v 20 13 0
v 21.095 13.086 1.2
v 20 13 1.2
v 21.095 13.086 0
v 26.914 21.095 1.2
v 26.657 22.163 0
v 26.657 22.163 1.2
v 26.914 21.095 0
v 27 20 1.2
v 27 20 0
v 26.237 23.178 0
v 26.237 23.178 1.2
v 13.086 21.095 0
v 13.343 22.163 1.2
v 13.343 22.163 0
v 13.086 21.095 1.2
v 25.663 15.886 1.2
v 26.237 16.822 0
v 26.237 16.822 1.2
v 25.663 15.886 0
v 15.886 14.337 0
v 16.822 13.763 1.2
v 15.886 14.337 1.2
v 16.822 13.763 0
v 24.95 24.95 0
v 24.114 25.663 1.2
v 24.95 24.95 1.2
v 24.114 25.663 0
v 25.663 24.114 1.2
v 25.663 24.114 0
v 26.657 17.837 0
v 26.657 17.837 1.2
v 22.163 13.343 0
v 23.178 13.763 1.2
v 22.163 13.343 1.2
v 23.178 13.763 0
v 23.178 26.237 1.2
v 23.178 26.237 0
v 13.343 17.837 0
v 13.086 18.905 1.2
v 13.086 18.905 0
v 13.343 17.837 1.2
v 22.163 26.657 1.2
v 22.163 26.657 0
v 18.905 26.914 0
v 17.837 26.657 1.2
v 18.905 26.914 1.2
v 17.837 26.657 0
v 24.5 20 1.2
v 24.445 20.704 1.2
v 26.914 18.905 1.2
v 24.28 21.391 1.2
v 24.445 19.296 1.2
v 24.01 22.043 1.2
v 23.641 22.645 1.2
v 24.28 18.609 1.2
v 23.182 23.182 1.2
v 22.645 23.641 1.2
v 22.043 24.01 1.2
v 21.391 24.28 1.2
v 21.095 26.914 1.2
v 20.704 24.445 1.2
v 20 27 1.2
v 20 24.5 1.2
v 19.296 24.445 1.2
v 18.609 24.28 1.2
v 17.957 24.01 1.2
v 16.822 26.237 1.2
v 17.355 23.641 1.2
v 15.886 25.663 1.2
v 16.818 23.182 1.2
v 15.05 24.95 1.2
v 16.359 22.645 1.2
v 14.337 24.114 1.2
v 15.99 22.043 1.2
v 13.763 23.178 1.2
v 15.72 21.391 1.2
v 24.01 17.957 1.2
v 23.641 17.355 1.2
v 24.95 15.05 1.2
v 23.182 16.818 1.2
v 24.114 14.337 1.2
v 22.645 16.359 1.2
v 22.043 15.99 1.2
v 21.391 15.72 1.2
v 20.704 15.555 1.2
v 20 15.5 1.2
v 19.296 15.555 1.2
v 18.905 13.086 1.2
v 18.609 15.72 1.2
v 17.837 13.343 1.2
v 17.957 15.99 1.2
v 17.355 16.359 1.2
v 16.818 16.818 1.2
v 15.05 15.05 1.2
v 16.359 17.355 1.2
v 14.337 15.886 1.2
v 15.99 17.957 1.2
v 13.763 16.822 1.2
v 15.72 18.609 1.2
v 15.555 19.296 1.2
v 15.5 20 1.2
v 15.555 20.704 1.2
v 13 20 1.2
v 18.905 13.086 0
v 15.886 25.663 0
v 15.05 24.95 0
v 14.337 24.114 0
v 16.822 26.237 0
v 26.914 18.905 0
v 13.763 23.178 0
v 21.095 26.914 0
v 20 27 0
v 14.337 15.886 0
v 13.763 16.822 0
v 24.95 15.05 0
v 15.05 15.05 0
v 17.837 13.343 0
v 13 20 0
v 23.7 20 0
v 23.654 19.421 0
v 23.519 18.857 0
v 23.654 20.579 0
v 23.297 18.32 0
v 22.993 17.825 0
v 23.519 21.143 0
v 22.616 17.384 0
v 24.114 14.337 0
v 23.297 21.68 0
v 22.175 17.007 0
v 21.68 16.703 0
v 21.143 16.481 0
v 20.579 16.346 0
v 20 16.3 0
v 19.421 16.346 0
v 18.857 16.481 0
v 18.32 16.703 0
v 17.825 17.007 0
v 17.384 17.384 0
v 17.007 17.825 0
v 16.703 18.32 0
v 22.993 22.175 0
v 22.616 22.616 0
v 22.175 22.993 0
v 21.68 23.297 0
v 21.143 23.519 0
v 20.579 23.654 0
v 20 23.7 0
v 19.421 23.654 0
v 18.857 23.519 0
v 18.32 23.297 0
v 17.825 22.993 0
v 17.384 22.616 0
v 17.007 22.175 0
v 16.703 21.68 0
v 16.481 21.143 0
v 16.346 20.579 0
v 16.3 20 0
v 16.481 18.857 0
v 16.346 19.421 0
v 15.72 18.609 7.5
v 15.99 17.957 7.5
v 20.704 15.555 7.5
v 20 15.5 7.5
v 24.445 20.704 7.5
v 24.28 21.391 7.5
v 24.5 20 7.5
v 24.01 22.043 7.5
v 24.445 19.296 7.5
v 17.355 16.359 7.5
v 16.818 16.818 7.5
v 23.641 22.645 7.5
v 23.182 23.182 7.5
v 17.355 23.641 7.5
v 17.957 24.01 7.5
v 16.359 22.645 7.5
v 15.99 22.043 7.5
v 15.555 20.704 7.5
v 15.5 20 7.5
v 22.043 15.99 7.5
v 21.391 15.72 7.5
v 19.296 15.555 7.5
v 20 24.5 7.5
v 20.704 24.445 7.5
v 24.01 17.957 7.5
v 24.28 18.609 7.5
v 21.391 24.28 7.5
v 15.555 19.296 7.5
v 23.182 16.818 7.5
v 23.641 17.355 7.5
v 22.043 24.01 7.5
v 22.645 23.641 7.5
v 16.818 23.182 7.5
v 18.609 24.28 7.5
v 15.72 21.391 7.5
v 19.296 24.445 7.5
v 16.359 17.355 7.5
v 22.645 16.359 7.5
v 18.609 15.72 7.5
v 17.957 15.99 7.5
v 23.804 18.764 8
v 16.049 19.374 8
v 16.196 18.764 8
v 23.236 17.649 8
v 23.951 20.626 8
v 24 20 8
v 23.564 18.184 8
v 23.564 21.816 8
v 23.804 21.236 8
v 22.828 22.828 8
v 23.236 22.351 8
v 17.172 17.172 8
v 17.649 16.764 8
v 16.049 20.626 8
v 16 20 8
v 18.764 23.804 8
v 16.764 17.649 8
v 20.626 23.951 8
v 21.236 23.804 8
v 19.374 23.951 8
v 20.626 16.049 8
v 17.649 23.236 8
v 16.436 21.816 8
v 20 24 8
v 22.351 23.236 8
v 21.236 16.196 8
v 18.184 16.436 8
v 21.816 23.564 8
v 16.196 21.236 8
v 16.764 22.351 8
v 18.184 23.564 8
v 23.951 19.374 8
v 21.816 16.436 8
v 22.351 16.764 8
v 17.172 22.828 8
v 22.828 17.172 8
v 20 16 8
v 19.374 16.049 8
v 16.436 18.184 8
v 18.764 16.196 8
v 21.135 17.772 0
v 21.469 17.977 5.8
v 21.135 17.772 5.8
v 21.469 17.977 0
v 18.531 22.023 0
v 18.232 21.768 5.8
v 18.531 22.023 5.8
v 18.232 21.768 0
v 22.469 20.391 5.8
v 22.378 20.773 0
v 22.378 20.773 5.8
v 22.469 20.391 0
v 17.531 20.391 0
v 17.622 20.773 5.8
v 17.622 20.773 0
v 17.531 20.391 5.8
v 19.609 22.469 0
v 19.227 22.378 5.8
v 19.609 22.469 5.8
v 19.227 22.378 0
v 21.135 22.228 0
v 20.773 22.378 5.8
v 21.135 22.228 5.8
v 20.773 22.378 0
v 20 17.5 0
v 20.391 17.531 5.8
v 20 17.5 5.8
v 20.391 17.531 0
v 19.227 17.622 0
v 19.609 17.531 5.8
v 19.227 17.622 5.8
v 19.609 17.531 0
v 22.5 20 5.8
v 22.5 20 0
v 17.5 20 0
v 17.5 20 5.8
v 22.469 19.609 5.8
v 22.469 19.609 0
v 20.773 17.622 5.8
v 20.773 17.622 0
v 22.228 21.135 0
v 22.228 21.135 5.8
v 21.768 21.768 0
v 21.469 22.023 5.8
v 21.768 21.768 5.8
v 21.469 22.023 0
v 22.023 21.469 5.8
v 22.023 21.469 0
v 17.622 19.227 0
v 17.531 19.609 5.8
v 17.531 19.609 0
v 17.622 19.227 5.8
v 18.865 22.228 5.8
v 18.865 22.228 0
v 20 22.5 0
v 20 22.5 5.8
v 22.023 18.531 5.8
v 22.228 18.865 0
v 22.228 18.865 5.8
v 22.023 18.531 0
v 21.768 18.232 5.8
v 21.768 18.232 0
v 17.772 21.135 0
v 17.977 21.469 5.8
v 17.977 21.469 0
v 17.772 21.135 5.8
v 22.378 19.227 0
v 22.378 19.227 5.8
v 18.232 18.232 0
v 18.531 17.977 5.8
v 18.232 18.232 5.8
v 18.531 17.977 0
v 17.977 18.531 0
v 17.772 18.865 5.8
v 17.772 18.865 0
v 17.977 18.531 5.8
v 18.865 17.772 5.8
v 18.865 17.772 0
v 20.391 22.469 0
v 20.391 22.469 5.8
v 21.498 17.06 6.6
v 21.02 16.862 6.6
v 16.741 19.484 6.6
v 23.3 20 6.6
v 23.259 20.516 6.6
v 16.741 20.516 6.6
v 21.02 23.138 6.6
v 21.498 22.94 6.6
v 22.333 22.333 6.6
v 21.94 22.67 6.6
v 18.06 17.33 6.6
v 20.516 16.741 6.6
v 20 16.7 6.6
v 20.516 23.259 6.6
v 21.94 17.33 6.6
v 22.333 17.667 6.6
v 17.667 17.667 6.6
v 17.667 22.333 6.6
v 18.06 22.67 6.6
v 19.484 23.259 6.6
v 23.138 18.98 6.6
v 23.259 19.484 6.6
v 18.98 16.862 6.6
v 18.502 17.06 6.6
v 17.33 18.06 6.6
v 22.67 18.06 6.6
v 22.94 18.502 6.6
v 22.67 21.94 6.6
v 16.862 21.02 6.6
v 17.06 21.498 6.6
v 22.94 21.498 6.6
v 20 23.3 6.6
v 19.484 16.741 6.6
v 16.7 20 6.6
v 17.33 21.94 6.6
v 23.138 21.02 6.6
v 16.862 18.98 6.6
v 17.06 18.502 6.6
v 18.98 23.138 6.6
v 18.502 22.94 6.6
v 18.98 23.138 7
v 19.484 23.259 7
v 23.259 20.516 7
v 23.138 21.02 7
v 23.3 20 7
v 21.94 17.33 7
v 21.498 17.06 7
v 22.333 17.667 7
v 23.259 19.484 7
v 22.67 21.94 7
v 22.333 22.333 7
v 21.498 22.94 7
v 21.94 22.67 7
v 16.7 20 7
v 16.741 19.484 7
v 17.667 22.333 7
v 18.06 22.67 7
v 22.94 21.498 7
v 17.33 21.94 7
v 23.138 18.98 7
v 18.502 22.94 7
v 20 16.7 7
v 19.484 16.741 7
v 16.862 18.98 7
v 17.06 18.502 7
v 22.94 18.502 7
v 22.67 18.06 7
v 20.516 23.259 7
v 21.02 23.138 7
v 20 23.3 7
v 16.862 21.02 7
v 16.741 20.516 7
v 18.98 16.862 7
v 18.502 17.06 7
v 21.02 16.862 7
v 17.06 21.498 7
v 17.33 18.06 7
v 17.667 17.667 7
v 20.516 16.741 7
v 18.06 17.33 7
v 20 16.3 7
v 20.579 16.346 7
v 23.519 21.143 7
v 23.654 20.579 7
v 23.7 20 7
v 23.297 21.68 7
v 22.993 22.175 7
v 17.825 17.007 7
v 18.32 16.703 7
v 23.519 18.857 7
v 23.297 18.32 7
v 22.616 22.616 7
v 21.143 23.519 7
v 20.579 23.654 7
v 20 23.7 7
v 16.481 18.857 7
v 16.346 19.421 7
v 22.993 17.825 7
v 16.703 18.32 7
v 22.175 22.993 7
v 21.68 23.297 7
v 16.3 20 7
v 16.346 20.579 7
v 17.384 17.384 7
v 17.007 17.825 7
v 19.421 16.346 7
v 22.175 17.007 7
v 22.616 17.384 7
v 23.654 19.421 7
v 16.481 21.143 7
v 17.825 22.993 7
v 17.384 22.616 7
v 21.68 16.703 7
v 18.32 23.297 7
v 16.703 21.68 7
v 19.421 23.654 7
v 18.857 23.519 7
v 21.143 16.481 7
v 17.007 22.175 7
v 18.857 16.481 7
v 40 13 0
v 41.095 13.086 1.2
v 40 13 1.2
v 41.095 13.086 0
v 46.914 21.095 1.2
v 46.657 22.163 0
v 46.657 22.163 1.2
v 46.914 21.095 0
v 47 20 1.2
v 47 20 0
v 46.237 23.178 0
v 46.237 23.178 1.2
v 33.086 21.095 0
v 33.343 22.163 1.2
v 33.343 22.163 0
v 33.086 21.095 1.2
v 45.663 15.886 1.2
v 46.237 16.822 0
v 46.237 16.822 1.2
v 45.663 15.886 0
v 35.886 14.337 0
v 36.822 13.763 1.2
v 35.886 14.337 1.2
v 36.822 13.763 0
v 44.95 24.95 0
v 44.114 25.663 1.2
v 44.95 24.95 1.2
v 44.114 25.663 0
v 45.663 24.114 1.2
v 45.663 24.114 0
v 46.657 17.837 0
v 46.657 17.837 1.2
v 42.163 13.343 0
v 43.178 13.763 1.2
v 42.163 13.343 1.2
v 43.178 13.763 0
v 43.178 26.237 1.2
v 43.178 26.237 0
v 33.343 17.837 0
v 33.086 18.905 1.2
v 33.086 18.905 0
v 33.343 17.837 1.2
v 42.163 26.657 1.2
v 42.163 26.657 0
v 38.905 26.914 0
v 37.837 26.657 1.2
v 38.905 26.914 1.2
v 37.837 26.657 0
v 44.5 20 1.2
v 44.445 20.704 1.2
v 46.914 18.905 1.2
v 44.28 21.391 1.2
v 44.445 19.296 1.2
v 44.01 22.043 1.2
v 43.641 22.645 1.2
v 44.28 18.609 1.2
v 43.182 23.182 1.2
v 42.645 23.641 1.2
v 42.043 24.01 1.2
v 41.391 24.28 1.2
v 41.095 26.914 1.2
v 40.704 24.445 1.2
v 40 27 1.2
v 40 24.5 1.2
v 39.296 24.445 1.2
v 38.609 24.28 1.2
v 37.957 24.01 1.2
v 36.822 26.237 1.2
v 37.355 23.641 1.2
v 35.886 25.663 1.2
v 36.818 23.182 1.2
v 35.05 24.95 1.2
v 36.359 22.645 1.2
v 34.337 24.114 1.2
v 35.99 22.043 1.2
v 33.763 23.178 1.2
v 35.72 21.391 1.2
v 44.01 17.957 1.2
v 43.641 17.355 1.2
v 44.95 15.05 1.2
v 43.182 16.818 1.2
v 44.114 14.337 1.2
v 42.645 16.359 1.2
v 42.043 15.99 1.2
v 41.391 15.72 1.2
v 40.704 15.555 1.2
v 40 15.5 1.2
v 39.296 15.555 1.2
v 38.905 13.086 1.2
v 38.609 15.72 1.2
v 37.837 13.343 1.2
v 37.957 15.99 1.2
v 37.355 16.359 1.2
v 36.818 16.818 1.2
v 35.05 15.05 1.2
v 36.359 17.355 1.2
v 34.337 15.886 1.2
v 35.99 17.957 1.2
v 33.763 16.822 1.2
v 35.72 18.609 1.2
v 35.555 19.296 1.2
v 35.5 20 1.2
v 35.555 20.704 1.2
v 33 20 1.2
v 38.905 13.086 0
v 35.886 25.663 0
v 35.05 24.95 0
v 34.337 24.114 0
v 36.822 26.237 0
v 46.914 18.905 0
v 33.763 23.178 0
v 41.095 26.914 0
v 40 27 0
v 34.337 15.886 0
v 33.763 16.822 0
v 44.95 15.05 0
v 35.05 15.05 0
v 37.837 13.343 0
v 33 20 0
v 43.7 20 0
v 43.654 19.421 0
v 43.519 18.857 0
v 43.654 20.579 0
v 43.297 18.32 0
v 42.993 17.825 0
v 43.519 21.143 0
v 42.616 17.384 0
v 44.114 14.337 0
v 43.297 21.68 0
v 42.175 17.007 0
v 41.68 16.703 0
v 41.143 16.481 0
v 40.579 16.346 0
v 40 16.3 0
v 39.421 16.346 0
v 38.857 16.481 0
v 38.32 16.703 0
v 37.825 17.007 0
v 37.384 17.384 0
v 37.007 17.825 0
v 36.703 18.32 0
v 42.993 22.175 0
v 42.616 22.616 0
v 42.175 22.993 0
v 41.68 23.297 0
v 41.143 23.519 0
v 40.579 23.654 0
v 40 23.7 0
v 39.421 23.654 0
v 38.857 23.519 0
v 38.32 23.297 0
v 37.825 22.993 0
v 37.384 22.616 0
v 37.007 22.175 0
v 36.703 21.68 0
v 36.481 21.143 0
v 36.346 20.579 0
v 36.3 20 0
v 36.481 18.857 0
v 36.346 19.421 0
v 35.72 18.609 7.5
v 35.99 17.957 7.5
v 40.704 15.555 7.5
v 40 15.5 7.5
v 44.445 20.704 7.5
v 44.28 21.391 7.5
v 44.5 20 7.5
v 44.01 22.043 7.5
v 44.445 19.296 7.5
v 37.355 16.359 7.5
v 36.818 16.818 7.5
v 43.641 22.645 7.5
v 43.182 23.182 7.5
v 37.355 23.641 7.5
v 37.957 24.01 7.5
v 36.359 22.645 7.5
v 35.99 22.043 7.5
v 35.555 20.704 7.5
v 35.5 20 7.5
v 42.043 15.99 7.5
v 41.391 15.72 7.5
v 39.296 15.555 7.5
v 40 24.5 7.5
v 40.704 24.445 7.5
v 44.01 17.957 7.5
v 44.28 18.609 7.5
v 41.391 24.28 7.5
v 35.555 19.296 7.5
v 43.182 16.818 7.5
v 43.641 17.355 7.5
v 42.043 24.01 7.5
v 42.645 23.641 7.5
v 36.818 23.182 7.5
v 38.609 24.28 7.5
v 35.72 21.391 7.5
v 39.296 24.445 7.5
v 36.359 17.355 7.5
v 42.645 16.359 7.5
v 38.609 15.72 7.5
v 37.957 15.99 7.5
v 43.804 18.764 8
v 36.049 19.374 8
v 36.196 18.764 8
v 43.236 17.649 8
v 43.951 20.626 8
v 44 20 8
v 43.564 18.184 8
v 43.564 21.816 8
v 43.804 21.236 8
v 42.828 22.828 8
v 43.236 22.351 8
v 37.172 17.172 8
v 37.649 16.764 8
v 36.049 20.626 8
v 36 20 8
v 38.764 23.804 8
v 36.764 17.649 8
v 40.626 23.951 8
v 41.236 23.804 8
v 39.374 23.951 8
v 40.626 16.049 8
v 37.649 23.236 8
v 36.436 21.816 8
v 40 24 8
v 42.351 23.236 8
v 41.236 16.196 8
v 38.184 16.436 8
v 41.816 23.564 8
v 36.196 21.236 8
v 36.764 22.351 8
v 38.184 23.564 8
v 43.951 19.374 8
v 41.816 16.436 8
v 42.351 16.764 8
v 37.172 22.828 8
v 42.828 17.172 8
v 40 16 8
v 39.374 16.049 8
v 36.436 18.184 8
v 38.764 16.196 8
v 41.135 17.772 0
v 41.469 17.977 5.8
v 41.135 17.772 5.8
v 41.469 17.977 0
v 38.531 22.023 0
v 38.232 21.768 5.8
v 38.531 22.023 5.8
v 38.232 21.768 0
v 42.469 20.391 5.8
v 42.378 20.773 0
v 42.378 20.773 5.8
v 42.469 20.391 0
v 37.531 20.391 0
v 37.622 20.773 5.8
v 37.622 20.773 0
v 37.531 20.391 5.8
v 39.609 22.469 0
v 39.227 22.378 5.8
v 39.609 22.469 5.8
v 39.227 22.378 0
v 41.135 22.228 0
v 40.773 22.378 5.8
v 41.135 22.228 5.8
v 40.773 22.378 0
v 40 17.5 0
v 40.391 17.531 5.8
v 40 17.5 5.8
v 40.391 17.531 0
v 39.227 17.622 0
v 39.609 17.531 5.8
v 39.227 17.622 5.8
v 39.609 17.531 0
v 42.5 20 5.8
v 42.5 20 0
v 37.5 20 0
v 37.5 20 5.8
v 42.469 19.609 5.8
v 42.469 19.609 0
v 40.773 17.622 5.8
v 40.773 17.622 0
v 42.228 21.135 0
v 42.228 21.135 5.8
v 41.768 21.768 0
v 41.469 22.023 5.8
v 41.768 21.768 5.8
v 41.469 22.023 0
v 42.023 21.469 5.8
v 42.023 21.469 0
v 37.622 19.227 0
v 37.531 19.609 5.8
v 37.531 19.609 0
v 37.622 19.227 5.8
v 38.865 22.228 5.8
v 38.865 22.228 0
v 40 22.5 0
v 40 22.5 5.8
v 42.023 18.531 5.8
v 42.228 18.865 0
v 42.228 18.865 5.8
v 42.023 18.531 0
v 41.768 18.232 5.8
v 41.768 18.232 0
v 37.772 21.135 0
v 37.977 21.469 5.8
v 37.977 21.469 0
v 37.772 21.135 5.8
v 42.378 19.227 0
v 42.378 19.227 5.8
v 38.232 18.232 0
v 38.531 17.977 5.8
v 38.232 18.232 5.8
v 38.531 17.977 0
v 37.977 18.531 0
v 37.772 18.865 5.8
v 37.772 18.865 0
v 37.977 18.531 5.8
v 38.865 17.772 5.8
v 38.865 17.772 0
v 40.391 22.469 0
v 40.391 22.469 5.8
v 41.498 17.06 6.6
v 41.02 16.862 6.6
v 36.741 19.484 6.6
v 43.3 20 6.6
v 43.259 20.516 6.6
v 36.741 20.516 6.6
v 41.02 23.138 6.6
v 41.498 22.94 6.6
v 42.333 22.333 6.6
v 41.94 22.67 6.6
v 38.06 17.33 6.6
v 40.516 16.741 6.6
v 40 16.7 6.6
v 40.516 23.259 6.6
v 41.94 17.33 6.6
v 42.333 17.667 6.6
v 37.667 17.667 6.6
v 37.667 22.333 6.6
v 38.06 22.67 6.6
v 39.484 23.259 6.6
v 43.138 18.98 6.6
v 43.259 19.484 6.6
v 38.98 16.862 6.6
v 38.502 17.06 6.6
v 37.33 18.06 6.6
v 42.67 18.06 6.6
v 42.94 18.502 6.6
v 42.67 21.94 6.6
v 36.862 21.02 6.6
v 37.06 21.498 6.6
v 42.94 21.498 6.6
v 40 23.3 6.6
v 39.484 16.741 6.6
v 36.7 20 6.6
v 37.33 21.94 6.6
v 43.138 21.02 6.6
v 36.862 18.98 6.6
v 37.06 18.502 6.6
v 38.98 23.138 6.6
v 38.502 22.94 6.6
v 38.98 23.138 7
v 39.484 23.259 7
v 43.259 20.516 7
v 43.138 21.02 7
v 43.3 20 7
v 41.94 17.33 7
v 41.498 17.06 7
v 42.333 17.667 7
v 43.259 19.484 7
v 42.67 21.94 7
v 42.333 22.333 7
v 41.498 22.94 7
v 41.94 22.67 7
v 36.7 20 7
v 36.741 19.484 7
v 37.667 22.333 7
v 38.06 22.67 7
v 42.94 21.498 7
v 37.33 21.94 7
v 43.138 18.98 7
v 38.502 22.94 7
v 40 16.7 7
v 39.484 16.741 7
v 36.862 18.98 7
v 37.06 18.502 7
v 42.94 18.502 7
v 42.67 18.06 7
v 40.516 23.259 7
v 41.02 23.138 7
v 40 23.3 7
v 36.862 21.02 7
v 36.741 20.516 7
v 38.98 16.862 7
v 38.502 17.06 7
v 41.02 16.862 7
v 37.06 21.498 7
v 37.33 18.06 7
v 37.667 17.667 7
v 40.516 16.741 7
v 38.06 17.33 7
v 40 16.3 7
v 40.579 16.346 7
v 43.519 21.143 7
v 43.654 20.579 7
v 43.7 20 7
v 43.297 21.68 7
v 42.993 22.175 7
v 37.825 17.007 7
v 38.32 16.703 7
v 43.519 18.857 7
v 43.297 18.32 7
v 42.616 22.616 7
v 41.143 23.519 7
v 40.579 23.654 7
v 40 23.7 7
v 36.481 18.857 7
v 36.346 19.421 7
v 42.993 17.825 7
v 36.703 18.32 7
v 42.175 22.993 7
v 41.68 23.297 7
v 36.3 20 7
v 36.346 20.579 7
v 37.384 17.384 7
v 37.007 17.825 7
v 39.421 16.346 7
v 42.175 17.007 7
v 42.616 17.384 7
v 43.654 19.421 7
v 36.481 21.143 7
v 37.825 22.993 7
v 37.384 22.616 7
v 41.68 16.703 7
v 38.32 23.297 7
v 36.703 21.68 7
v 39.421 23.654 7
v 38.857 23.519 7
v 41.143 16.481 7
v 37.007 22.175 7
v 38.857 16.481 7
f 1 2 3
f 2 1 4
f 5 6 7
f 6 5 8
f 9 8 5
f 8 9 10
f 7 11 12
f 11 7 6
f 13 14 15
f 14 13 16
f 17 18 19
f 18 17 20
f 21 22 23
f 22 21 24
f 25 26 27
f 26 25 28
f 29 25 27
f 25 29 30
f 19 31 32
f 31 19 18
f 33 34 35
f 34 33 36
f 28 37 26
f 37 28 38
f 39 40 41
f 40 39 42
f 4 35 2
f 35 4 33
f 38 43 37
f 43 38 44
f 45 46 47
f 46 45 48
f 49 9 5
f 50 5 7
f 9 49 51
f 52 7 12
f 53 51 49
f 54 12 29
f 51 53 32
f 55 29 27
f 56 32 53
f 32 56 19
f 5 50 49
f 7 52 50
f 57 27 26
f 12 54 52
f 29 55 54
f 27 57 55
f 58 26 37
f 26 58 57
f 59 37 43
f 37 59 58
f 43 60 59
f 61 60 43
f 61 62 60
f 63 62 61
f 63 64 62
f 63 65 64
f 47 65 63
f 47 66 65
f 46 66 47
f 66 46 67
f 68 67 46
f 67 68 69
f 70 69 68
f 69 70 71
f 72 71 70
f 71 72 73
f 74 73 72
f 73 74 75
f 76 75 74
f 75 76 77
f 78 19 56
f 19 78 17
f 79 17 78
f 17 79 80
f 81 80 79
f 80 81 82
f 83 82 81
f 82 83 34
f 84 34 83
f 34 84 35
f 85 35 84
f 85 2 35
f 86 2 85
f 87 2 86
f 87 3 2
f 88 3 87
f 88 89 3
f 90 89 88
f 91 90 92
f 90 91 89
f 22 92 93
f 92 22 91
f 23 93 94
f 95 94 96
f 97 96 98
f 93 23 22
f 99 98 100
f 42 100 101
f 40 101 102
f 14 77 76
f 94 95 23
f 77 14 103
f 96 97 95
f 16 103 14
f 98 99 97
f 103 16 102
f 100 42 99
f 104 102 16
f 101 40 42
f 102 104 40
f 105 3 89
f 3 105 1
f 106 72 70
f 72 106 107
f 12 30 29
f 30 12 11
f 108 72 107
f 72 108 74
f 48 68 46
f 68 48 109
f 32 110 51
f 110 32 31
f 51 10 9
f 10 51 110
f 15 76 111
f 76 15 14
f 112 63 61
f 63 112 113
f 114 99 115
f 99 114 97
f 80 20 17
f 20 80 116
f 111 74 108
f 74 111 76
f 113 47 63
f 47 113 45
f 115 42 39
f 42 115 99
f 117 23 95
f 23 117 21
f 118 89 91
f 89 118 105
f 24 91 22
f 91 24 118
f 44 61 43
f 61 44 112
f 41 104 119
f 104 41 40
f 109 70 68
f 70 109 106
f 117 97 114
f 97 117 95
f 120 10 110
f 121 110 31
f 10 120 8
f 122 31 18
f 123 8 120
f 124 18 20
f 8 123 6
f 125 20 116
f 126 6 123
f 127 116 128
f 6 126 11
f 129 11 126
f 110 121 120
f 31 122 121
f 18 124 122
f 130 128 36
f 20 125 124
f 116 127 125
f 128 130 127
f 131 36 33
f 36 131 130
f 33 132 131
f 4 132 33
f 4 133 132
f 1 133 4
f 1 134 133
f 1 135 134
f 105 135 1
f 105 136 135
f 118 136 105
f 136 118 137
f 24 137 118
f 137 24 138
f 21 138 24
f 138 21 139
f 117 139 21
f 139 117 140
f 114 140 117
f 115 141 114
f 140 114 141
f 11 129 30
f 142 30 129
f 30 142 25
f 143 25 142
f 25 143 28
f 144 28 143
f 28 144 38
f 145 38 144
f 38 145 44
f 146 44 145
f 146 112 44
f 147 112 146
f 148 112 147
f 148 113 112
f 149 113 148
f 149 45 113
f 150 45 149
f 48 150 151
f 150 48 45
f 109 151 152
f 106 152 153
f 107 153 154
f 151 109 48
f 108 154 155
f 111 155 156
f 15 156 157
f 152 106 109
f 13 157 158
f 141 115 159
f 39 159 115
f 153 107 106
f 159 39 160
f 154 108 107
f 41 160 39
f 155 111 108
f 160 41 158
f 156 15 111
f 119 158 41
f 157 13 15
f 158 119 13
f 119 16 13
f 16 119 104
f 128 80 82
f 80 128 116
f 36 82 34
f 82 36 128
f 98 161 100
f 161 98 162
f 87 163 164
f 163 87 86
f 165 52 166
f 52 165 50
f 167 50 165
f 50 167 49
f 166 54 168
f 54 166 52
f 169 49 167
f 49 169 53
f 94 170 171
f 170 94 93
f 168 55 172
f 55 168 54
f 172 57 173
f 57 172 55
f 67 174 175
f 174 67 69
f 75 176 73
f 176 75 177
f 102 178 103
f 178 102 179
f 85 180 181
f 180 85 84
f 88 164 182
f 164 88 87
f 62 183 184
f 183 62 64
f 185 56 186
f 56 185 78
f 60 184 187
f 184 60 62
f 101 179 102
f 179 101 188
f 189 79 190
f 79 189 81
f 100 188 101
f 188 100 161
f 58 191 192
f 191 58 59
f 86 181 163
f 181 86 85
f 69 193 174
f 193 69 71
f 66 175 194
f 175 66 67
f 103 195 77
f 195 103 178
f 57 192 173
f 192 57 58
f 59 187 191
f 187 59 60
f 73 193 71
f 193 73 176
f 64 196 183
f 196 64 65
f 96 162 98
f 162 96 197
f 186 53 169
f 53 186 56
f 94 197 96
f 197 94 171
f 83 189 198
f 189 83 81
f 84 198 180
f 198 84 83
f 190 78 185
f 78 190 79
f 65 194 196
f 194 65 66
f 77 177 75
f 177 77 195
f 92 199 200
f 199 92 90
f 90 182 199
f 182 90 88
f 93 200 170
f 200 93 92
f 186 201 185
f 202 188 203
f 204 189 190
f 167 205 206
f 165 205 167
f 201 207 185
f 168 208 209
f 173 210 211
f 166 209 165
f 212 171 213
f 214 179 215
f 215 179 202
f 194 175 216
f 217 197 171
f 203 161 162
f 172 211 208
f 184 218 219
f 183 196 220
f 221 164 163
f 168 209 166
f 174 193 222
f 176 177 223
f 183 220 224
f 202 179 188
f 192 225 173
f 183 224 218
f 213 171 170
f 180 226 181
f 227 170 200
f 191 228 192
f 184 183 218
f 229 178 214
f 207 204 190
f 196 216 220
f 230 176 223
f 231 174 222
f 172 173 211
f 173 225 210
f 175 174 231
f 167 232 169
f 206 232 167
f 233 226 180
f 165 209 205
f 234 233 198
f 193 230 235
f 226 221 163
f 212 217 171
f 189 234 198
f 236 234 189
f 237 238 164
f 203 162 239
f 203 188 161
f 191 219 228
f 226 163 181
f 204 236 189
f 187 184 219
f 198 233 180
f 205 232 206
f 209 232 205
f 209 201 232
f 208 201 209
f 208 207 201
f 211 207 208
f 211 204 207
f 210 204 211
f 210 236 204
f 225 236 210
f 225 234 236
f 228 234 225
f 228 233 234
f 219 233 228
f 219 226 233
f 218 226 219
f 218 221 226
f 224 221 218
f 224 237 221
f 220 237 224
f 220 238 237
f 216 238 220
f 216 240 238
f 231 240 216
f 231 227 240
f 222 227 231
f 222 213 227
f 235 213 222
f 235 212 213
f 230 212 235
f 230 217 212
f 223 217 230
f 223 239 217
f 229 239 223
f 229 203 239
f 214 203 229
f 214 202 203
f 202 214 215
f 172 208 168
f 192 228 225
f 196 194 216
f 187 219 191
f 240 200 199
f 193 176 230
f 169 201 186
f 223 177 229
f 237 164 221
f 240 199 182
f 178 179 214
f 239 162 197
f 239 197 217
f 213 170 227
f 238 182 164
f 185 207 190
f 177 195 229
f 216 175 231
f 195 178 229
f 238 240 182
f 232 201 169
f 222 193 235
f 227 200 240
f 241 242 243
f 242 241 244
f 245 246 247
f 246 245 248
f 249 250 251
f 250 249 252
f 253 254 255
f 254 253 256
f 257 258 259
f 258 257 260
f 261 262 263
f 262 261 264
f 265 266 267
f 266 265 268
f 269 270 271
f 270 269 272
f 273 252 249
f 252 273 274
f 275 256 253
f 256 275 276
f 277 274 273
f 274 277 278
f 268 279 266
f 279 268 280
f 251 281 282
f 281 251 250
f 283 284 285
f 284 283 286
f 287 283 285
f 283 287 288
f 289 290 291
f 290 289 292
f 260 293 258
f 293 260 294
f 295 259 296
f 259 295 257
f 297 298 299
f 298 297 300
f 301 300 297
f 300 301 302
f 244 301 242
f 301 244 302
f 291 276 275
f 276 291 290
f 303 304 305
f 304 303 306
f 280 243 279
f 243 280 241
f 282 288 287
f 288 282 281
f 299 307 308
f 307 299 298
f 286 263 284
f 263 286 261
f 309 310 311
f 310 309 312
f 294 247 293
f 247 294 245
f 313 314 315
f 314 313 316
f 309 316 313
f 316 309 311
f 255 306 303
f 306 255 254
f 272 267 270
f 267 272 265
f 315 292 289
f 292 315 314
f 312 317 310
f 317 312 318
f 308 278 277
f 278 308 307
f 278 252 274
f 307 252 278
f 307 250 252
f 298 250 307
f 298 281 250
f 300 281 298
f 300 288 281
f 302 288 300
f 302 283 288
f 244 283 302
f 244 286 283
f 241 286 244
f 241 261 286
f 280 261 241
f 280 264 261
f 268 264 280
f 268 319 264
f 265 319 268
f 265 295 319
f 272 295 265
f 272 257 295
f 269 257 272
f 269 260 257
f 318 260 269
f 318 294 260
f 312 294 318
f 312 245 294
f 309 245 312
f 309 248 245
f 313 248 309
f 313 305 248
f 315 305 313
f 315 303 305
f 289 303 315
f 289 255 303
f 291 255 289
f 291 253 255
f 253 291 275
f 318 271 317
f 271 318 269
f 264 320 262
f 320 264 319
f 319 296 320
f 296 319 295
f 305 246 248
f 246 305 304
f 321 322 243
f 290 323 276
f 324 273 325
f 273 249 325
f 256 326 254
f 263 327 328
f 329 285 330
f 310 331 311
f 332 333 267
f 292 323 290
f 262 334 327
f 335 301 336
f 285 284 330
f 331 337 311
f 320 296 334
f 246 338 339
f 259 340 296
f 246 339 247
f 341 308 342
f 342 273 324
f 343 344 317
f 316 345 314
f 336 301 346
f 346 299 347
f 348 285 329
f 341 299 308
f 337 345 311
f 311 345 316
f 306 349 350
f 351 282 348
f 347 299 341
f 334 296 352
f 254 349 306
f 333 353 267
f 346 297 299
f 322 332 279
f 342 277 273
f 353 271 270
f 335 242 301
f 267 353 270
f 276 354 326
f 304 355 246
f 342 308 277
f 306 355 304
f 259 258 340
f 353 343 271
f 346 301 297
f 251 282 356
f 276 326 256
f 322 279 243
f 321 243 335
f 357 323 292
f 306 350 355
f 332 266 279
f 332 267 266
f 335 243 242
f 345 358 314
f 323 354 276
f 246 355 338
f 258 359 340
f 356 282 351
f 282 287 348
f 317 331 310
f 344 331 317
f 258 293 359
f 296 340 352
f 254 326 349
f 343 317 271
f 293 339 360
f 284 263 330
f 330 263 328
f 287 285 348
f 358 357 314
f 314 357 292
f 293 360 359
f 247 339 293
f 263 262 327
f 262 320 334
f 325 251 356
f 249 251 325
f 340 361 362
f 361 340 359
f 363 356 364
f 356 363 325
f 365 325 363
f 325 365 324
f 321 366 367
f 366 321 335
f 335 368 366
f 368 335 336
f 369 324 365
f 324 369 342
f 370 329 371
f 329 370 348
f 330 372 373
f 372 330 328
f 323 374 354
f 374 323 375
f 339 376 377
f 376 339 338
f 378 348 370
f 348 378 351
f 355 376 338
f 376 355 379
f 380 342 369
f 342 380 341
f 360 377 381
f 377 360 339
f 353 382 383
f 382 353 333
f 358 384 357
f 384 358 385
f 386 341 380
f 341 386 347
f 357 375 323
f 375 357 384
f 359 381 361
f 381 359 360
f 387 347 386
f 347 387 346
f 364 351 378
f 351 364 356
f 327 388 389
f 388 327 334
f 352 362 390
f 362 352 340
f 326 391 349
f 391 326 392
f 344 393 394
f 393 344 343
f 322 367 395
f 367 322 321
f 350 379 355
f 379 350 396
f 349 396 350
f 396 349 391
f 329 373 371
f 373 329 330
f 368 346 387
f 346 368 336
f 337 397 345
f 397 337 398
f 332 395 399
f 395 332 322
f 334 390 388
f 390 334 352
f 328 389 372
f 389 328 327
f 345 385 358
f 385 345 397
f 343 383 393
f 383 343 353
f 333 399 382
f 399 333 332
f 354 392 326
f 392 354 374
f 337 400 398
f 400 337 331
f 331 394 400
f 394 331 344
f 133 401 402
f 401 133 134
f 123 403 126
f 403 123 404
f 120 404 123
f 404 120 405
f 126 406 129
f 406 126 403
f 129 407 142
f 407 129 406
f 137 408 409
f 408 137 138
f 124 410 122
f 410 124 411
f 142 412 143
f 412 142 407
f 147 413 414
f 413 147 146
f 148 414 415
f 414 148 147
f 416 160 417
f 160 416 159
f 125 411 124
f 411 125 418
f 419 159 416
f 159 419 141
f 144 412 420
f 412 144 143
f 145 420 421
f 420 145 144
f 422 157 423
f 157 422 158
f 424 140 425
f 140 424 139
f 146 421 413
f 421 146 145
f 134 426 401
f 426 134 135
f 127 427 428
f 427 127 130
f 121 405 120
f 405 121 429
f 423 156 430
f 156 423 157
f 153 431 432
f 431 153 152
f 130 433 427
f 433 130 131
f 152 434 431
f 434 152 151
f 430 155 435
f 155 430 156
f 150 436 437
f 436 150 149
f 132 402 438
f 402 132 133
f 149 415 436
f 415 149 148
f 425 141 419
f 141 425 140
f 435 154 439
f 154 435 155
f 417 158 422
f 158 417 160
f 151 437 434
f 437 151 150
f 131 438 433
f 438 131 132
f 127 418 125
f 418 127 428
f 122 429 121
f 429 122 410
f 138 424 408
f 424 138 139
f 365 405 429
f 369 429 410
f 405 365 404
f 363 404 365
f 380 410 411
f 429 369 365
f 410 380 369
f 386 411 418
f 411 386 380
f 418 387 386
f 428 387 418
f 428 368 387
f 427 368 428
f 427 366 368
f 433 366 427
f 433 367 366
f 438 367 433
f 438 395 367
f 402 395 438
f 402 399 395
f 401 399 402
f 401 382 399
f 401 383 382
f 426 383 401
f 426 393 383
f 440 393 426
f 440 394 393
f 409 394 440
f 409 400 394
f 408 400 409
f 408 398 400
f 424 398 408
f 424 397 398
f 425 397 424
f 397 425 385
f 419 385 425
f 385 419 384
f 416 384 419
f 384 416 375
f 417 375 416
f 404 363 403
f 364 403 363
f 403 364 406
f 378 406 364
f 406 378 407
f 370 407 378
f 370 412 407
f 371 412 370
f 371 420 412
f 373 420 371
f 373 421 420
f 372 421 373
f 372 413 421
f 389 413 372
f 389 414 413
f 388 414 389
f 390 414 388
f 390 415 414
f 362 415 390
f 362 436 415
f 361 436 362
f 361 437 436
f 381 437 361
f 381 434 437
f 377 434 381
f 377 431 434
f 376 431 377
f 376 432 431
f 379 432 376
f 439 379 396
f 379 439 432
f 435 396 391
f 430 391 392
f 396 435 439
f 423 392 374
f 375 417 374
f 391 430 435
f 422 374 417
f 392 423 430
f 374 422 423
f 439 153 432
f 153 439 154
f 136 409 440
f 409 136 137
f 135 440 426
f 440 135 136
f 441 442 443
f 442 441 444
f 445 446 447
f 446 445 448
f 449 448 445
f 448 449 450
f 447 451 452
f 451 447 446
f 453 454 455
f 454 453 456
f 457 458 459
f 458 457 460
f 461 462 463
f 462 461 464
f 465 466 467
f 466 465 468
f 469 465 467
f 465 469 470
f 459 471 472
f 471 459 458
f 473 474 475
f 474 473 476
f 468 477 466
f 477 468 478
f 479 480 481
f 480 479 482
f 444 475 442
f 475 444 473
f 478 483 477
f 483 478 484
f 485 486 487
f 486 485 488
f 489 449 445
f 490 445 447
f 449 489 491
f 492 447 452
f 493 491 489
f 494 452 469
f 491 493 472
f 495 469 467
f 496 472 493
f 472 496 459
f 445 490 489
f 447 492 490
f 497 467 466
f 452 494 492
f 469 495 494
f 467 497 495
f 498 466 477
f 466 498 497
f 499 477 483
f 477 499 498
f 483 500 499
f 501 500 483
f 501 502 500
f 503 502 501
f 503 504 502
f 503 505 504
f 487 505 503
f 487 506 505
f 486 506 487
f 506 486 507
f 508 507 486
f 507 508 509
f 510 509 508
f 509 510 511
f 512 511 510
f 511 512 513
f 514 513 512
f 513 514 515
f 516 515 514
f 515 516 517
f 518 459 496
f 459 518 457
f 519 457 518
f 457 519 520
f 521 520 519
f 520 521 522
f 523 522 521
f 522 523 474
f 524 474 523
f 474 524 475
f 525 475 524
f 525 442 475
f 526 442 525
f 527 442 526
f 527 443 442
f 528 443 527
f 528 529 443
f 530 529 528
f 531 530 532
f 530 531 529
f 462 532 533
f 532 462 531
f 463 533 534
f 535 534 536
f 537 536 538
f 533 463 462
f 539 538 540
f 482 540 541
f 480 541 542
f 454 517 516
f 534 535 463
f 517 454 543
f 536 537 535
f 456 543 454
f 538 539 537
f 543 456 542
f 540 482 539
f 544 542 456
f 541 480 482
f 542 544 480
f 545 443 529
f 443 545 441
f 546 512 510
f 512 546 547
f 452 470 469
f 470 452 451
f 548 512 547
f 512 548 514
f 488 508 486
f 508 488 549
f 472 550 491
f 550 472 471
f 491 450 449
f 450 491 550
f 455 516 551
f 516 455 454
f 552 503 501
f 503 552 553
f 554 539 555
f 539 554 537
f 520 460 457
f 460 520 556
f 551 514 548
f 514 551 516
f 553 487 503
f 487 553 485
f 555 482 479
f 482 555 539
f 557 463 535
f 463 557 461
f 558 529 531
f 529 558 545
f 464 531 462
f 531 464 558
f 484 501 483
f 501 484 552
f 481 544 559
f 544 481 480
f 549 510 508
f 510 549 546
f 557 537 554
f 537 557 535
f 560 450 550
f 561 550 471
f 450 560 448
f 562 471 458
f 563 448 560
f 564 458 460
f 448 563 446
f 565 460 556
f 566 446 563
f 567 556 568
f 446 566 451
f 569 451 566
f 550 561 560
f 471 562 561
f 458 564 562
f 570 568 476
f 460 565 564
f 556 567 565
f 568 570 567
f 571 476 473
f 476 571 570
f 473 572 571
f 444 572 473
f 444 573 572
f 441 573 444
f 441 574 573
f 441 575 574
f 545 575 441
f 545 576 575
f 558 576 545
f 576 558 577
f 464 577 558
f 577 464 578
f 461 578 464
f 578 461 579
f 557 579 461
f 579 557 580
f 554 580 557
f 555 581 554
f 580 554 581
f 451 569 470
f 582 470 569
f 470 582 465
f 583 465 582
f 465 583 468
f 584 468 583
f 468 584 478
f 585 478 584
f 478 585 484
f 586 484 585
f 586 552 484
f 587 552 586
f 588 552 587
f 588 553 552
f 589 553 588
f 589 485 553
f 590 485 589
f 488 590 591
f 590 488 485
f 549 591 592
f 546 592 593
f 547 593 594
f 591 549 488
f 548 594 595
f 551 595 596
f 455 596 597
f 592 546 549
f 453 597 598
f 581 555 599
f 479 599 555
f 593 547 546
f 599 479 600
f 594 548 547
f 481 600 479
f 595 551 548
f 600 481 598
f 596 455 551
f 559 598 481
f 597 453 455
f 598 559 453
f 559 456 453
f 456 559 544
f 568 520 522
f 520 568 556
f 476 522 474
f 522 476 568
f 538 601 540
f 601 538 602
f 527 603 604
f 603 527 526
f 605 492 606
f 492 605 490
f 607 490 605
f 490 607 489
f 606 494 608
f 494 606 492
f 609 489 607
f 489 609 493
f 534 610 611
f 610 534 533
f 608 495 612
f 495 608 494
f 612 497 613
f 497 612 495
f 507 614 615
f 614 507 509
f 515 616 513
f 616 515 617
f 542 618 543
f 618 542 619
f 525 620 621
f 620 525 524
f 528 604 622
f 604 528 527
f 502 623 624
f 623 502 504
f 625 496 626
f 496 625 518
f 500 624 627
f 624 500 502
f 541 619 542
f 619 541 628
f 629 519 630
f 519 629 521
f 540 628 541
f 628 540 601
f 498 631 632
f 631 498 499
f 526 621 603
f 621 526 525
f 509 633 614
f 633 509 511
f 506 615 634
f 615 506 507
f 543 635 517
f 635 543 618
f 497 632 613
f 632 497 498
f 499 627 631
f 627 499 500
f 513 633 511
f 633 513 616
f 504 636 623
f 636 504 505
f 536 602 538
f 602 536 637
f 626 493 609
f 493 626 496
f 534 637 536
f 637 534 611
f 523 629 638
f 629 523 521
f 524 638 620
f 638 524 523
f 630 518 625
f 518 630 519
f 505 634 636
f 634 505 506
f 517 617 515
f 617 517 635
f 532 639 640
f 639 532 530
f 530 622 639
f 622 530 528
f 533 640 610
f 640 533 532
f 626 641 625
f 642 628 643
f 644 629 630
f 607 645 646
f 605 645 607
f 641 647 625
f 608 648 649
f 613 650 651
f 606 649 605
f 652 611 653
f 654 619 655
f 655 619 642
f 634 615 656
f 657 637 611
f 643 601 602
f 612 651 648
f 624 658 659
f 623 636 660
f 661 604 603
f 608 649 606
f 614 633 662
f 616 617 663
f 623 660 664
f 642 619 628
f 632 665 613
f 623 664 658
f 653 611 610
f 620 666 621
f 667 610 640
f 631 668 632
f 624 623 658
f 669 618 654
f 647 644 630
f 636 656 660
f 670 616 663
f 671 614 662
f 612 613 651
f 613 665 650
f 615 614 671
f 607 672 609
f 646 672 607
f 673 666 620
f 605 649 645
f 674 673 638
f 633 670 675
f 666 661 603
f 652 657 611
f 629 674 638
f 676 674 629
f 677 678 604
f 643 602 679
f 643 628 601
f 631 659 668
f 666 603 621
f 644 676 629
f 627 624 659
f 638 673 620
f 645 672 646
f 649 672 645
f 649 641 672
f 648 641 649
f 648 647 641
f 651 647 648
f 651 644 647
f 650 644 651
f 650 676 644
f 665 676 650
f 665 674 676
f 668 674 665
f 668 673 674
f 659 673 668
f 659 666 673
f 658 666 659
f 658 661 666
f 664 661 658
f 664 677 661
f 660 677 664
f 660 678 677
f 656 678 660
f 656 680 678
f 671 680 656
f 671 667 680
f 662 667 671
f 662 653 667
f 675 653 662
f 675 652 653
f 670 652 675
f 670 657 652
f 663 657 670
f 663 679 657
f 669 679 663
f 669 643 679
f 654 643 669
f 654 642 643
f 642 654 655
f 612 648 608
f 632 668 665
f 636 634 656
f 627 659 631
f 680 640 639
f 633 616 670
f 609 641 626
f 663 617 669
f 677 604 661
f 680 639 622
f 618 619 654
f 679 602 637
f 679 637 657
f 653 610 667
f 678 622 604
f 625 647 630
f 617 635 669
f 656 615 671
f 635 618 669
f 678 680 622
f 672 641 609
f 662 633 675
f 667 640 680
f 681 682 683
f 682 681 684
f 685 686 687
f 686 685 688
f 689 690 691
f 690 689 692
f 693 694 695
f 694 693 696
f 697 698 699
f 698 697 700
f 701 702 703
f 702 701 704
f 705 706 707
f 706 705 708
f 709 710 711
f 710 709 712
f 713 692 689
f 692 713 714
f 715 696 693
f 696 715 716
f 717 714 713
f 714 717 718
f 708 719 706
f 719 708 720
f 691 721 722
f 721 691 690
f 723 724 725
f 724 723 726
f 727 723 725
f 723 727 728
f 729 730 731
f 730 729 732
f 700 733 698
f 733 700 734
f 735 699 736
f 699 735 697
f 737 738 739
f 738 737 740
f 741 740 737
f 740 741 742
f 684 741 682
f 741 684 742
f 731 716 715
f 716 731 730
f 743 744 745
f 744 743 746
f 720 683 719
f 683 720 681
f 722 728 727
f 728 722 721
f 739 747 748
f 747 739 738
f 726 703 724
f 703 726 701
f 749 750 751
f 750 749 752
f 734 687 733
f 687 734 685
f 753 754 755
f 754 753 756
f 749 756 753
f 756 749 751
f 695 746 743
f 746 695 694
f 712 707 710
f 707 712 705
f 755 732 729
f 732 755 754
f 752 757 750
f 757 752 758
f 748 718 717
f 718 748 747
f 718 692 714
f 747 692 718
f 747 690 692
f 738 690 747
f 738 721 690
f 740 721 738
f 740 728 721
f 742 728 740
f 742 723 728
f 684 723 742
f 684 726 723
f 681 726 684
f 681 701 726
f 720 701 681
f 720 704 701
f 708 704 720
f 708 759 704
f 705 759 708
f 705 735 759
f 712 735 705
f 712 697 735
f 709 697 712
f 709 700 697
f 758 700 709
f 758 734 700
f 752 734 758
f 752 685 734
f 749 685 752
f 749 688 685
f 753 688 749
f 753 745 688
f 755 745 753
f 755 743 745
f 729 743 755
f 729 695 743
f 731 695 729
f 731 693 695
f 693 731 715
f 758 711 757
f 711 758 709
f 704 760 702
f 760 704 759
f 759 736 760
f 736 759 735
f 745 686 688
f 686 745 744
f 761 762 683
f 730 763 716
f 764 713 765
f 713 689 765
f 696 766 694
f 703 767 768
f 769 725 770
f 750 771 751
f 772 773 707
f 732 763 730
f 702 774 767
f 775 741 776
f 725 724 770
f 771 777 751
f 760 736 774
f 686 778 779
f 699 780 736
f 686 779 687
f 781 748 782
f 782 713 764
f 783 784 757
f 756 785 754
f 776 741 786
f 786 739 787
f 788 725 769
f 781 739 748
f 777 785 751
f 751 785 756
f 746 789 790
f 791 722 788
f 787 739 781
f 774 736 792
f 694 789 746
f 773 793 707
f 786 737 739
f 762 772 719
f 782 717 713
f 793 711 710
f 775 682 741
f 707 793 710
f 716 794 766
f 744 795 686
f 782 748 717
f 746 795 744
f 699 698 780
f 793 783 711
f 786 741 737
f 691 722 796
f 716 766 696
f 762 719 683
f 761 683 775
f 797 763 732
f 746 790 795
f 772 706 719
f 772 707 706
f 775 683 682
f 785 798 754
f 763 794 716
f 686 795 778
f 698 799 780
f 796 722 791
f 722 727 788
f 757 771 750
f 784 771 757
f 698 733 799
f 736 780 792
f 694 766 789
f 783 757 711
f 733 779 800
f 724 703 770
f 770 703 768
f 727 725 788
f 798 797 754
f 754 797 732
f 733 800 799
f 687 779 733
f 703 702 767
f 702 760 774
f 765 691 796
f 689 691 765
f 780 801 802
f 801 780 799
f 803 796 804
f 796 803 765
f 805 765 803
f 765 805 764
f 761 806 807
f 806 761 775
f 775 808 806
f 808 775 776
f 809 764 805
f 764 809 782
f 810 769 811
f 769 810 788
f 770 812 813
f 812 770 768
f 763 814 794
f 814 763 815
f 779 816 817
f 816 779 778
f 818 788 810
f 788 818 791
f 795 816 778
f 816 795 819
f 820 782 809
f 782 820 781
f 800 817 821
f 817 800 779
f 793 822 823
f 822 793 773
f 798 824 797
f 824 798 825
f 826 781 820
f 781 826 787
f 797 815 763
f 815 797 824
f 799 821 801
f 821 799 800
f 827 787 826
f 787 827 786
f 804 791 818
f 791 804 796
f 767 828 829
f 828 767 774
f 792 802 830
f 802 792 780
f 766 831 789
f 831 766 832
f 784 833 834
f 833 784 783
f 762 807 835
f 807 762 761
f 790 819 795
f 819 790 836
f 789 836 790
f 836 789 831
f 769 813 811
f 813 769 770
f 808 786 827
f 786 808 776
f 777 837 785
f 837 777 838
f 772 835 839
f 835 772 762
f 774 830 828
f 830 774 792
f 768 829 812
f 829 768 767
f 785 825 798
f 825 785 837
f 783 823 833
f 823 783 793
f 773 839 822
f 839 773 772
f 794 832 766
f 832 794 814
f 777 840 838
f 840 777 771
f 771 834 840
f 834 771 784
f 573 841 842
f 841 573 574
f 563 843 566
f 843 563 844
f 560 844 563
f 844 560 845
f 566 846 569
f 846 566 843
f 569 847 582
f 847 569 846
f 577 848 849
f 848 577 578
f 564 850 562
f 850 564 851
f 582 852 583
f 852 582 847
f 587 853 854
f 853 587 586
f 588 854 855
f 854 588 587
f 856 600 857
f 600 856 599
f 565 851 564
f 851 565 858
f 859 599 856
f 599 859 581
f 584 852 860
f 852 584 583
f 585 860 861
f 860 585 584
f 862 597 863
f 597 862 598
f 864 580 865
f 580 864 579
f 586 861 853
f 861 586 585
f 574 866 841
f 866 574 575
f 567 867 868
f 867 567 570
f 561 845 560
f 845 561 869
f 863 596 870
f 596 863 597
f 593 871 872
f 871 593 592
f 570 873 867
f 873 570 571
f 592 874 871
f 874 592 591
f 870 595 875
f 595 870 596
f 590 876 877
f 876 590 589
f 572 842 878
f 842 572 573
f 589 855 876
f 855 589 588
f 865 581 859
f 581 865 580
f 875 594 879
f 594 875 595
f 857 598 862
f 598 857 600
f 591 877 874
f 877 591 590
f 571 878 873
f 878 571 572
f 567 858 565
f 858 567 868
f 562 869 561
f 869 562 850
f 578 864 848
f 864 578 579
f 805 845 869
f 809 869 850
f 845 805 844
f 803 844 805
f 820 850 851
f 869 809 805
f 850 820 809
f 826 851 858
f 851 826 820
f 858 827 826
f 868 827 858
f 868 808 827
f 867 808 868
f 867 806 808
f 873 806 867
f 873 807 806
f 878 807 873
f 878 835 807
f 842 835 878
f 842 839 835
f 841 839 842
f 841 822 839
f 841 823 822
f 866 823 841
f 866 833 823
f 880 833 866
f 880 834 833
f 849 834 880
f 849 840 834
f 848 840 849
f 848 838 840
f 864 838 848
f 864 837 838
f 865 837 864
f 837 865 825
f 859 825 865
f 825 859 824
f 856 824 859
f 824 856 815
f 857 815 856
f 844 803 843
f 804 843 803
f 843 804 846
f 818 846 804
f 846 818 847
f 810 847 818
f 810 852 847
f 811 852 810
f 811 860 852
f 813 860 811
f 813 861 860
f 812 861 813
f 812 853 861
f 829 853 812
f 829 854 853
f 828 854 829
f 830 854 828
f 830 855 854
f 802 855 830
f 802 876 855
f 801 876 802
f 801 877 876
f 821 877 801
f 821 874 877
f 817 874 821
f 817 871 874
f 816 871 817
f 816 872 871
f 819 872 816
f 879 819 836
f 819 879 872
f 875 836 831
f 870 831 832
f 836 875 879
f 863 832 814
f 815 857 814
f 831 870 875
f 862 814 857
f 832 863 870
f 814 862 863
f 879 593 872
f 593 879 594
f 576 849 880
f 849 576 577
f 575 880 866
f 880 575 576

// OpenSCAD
include <../lib/eink-dual-lora-case-lib.scad>;
$fn = 40;
// Two materials: TPU boots with PETG plungers fused into their roofs, flange
// down.
for (i = [0, 1]) translate([20 + i * 20, 20, 0]) {
  color("#e07b39") boot_tpu();
  color("#d9d9d9") boot_stem();
}
